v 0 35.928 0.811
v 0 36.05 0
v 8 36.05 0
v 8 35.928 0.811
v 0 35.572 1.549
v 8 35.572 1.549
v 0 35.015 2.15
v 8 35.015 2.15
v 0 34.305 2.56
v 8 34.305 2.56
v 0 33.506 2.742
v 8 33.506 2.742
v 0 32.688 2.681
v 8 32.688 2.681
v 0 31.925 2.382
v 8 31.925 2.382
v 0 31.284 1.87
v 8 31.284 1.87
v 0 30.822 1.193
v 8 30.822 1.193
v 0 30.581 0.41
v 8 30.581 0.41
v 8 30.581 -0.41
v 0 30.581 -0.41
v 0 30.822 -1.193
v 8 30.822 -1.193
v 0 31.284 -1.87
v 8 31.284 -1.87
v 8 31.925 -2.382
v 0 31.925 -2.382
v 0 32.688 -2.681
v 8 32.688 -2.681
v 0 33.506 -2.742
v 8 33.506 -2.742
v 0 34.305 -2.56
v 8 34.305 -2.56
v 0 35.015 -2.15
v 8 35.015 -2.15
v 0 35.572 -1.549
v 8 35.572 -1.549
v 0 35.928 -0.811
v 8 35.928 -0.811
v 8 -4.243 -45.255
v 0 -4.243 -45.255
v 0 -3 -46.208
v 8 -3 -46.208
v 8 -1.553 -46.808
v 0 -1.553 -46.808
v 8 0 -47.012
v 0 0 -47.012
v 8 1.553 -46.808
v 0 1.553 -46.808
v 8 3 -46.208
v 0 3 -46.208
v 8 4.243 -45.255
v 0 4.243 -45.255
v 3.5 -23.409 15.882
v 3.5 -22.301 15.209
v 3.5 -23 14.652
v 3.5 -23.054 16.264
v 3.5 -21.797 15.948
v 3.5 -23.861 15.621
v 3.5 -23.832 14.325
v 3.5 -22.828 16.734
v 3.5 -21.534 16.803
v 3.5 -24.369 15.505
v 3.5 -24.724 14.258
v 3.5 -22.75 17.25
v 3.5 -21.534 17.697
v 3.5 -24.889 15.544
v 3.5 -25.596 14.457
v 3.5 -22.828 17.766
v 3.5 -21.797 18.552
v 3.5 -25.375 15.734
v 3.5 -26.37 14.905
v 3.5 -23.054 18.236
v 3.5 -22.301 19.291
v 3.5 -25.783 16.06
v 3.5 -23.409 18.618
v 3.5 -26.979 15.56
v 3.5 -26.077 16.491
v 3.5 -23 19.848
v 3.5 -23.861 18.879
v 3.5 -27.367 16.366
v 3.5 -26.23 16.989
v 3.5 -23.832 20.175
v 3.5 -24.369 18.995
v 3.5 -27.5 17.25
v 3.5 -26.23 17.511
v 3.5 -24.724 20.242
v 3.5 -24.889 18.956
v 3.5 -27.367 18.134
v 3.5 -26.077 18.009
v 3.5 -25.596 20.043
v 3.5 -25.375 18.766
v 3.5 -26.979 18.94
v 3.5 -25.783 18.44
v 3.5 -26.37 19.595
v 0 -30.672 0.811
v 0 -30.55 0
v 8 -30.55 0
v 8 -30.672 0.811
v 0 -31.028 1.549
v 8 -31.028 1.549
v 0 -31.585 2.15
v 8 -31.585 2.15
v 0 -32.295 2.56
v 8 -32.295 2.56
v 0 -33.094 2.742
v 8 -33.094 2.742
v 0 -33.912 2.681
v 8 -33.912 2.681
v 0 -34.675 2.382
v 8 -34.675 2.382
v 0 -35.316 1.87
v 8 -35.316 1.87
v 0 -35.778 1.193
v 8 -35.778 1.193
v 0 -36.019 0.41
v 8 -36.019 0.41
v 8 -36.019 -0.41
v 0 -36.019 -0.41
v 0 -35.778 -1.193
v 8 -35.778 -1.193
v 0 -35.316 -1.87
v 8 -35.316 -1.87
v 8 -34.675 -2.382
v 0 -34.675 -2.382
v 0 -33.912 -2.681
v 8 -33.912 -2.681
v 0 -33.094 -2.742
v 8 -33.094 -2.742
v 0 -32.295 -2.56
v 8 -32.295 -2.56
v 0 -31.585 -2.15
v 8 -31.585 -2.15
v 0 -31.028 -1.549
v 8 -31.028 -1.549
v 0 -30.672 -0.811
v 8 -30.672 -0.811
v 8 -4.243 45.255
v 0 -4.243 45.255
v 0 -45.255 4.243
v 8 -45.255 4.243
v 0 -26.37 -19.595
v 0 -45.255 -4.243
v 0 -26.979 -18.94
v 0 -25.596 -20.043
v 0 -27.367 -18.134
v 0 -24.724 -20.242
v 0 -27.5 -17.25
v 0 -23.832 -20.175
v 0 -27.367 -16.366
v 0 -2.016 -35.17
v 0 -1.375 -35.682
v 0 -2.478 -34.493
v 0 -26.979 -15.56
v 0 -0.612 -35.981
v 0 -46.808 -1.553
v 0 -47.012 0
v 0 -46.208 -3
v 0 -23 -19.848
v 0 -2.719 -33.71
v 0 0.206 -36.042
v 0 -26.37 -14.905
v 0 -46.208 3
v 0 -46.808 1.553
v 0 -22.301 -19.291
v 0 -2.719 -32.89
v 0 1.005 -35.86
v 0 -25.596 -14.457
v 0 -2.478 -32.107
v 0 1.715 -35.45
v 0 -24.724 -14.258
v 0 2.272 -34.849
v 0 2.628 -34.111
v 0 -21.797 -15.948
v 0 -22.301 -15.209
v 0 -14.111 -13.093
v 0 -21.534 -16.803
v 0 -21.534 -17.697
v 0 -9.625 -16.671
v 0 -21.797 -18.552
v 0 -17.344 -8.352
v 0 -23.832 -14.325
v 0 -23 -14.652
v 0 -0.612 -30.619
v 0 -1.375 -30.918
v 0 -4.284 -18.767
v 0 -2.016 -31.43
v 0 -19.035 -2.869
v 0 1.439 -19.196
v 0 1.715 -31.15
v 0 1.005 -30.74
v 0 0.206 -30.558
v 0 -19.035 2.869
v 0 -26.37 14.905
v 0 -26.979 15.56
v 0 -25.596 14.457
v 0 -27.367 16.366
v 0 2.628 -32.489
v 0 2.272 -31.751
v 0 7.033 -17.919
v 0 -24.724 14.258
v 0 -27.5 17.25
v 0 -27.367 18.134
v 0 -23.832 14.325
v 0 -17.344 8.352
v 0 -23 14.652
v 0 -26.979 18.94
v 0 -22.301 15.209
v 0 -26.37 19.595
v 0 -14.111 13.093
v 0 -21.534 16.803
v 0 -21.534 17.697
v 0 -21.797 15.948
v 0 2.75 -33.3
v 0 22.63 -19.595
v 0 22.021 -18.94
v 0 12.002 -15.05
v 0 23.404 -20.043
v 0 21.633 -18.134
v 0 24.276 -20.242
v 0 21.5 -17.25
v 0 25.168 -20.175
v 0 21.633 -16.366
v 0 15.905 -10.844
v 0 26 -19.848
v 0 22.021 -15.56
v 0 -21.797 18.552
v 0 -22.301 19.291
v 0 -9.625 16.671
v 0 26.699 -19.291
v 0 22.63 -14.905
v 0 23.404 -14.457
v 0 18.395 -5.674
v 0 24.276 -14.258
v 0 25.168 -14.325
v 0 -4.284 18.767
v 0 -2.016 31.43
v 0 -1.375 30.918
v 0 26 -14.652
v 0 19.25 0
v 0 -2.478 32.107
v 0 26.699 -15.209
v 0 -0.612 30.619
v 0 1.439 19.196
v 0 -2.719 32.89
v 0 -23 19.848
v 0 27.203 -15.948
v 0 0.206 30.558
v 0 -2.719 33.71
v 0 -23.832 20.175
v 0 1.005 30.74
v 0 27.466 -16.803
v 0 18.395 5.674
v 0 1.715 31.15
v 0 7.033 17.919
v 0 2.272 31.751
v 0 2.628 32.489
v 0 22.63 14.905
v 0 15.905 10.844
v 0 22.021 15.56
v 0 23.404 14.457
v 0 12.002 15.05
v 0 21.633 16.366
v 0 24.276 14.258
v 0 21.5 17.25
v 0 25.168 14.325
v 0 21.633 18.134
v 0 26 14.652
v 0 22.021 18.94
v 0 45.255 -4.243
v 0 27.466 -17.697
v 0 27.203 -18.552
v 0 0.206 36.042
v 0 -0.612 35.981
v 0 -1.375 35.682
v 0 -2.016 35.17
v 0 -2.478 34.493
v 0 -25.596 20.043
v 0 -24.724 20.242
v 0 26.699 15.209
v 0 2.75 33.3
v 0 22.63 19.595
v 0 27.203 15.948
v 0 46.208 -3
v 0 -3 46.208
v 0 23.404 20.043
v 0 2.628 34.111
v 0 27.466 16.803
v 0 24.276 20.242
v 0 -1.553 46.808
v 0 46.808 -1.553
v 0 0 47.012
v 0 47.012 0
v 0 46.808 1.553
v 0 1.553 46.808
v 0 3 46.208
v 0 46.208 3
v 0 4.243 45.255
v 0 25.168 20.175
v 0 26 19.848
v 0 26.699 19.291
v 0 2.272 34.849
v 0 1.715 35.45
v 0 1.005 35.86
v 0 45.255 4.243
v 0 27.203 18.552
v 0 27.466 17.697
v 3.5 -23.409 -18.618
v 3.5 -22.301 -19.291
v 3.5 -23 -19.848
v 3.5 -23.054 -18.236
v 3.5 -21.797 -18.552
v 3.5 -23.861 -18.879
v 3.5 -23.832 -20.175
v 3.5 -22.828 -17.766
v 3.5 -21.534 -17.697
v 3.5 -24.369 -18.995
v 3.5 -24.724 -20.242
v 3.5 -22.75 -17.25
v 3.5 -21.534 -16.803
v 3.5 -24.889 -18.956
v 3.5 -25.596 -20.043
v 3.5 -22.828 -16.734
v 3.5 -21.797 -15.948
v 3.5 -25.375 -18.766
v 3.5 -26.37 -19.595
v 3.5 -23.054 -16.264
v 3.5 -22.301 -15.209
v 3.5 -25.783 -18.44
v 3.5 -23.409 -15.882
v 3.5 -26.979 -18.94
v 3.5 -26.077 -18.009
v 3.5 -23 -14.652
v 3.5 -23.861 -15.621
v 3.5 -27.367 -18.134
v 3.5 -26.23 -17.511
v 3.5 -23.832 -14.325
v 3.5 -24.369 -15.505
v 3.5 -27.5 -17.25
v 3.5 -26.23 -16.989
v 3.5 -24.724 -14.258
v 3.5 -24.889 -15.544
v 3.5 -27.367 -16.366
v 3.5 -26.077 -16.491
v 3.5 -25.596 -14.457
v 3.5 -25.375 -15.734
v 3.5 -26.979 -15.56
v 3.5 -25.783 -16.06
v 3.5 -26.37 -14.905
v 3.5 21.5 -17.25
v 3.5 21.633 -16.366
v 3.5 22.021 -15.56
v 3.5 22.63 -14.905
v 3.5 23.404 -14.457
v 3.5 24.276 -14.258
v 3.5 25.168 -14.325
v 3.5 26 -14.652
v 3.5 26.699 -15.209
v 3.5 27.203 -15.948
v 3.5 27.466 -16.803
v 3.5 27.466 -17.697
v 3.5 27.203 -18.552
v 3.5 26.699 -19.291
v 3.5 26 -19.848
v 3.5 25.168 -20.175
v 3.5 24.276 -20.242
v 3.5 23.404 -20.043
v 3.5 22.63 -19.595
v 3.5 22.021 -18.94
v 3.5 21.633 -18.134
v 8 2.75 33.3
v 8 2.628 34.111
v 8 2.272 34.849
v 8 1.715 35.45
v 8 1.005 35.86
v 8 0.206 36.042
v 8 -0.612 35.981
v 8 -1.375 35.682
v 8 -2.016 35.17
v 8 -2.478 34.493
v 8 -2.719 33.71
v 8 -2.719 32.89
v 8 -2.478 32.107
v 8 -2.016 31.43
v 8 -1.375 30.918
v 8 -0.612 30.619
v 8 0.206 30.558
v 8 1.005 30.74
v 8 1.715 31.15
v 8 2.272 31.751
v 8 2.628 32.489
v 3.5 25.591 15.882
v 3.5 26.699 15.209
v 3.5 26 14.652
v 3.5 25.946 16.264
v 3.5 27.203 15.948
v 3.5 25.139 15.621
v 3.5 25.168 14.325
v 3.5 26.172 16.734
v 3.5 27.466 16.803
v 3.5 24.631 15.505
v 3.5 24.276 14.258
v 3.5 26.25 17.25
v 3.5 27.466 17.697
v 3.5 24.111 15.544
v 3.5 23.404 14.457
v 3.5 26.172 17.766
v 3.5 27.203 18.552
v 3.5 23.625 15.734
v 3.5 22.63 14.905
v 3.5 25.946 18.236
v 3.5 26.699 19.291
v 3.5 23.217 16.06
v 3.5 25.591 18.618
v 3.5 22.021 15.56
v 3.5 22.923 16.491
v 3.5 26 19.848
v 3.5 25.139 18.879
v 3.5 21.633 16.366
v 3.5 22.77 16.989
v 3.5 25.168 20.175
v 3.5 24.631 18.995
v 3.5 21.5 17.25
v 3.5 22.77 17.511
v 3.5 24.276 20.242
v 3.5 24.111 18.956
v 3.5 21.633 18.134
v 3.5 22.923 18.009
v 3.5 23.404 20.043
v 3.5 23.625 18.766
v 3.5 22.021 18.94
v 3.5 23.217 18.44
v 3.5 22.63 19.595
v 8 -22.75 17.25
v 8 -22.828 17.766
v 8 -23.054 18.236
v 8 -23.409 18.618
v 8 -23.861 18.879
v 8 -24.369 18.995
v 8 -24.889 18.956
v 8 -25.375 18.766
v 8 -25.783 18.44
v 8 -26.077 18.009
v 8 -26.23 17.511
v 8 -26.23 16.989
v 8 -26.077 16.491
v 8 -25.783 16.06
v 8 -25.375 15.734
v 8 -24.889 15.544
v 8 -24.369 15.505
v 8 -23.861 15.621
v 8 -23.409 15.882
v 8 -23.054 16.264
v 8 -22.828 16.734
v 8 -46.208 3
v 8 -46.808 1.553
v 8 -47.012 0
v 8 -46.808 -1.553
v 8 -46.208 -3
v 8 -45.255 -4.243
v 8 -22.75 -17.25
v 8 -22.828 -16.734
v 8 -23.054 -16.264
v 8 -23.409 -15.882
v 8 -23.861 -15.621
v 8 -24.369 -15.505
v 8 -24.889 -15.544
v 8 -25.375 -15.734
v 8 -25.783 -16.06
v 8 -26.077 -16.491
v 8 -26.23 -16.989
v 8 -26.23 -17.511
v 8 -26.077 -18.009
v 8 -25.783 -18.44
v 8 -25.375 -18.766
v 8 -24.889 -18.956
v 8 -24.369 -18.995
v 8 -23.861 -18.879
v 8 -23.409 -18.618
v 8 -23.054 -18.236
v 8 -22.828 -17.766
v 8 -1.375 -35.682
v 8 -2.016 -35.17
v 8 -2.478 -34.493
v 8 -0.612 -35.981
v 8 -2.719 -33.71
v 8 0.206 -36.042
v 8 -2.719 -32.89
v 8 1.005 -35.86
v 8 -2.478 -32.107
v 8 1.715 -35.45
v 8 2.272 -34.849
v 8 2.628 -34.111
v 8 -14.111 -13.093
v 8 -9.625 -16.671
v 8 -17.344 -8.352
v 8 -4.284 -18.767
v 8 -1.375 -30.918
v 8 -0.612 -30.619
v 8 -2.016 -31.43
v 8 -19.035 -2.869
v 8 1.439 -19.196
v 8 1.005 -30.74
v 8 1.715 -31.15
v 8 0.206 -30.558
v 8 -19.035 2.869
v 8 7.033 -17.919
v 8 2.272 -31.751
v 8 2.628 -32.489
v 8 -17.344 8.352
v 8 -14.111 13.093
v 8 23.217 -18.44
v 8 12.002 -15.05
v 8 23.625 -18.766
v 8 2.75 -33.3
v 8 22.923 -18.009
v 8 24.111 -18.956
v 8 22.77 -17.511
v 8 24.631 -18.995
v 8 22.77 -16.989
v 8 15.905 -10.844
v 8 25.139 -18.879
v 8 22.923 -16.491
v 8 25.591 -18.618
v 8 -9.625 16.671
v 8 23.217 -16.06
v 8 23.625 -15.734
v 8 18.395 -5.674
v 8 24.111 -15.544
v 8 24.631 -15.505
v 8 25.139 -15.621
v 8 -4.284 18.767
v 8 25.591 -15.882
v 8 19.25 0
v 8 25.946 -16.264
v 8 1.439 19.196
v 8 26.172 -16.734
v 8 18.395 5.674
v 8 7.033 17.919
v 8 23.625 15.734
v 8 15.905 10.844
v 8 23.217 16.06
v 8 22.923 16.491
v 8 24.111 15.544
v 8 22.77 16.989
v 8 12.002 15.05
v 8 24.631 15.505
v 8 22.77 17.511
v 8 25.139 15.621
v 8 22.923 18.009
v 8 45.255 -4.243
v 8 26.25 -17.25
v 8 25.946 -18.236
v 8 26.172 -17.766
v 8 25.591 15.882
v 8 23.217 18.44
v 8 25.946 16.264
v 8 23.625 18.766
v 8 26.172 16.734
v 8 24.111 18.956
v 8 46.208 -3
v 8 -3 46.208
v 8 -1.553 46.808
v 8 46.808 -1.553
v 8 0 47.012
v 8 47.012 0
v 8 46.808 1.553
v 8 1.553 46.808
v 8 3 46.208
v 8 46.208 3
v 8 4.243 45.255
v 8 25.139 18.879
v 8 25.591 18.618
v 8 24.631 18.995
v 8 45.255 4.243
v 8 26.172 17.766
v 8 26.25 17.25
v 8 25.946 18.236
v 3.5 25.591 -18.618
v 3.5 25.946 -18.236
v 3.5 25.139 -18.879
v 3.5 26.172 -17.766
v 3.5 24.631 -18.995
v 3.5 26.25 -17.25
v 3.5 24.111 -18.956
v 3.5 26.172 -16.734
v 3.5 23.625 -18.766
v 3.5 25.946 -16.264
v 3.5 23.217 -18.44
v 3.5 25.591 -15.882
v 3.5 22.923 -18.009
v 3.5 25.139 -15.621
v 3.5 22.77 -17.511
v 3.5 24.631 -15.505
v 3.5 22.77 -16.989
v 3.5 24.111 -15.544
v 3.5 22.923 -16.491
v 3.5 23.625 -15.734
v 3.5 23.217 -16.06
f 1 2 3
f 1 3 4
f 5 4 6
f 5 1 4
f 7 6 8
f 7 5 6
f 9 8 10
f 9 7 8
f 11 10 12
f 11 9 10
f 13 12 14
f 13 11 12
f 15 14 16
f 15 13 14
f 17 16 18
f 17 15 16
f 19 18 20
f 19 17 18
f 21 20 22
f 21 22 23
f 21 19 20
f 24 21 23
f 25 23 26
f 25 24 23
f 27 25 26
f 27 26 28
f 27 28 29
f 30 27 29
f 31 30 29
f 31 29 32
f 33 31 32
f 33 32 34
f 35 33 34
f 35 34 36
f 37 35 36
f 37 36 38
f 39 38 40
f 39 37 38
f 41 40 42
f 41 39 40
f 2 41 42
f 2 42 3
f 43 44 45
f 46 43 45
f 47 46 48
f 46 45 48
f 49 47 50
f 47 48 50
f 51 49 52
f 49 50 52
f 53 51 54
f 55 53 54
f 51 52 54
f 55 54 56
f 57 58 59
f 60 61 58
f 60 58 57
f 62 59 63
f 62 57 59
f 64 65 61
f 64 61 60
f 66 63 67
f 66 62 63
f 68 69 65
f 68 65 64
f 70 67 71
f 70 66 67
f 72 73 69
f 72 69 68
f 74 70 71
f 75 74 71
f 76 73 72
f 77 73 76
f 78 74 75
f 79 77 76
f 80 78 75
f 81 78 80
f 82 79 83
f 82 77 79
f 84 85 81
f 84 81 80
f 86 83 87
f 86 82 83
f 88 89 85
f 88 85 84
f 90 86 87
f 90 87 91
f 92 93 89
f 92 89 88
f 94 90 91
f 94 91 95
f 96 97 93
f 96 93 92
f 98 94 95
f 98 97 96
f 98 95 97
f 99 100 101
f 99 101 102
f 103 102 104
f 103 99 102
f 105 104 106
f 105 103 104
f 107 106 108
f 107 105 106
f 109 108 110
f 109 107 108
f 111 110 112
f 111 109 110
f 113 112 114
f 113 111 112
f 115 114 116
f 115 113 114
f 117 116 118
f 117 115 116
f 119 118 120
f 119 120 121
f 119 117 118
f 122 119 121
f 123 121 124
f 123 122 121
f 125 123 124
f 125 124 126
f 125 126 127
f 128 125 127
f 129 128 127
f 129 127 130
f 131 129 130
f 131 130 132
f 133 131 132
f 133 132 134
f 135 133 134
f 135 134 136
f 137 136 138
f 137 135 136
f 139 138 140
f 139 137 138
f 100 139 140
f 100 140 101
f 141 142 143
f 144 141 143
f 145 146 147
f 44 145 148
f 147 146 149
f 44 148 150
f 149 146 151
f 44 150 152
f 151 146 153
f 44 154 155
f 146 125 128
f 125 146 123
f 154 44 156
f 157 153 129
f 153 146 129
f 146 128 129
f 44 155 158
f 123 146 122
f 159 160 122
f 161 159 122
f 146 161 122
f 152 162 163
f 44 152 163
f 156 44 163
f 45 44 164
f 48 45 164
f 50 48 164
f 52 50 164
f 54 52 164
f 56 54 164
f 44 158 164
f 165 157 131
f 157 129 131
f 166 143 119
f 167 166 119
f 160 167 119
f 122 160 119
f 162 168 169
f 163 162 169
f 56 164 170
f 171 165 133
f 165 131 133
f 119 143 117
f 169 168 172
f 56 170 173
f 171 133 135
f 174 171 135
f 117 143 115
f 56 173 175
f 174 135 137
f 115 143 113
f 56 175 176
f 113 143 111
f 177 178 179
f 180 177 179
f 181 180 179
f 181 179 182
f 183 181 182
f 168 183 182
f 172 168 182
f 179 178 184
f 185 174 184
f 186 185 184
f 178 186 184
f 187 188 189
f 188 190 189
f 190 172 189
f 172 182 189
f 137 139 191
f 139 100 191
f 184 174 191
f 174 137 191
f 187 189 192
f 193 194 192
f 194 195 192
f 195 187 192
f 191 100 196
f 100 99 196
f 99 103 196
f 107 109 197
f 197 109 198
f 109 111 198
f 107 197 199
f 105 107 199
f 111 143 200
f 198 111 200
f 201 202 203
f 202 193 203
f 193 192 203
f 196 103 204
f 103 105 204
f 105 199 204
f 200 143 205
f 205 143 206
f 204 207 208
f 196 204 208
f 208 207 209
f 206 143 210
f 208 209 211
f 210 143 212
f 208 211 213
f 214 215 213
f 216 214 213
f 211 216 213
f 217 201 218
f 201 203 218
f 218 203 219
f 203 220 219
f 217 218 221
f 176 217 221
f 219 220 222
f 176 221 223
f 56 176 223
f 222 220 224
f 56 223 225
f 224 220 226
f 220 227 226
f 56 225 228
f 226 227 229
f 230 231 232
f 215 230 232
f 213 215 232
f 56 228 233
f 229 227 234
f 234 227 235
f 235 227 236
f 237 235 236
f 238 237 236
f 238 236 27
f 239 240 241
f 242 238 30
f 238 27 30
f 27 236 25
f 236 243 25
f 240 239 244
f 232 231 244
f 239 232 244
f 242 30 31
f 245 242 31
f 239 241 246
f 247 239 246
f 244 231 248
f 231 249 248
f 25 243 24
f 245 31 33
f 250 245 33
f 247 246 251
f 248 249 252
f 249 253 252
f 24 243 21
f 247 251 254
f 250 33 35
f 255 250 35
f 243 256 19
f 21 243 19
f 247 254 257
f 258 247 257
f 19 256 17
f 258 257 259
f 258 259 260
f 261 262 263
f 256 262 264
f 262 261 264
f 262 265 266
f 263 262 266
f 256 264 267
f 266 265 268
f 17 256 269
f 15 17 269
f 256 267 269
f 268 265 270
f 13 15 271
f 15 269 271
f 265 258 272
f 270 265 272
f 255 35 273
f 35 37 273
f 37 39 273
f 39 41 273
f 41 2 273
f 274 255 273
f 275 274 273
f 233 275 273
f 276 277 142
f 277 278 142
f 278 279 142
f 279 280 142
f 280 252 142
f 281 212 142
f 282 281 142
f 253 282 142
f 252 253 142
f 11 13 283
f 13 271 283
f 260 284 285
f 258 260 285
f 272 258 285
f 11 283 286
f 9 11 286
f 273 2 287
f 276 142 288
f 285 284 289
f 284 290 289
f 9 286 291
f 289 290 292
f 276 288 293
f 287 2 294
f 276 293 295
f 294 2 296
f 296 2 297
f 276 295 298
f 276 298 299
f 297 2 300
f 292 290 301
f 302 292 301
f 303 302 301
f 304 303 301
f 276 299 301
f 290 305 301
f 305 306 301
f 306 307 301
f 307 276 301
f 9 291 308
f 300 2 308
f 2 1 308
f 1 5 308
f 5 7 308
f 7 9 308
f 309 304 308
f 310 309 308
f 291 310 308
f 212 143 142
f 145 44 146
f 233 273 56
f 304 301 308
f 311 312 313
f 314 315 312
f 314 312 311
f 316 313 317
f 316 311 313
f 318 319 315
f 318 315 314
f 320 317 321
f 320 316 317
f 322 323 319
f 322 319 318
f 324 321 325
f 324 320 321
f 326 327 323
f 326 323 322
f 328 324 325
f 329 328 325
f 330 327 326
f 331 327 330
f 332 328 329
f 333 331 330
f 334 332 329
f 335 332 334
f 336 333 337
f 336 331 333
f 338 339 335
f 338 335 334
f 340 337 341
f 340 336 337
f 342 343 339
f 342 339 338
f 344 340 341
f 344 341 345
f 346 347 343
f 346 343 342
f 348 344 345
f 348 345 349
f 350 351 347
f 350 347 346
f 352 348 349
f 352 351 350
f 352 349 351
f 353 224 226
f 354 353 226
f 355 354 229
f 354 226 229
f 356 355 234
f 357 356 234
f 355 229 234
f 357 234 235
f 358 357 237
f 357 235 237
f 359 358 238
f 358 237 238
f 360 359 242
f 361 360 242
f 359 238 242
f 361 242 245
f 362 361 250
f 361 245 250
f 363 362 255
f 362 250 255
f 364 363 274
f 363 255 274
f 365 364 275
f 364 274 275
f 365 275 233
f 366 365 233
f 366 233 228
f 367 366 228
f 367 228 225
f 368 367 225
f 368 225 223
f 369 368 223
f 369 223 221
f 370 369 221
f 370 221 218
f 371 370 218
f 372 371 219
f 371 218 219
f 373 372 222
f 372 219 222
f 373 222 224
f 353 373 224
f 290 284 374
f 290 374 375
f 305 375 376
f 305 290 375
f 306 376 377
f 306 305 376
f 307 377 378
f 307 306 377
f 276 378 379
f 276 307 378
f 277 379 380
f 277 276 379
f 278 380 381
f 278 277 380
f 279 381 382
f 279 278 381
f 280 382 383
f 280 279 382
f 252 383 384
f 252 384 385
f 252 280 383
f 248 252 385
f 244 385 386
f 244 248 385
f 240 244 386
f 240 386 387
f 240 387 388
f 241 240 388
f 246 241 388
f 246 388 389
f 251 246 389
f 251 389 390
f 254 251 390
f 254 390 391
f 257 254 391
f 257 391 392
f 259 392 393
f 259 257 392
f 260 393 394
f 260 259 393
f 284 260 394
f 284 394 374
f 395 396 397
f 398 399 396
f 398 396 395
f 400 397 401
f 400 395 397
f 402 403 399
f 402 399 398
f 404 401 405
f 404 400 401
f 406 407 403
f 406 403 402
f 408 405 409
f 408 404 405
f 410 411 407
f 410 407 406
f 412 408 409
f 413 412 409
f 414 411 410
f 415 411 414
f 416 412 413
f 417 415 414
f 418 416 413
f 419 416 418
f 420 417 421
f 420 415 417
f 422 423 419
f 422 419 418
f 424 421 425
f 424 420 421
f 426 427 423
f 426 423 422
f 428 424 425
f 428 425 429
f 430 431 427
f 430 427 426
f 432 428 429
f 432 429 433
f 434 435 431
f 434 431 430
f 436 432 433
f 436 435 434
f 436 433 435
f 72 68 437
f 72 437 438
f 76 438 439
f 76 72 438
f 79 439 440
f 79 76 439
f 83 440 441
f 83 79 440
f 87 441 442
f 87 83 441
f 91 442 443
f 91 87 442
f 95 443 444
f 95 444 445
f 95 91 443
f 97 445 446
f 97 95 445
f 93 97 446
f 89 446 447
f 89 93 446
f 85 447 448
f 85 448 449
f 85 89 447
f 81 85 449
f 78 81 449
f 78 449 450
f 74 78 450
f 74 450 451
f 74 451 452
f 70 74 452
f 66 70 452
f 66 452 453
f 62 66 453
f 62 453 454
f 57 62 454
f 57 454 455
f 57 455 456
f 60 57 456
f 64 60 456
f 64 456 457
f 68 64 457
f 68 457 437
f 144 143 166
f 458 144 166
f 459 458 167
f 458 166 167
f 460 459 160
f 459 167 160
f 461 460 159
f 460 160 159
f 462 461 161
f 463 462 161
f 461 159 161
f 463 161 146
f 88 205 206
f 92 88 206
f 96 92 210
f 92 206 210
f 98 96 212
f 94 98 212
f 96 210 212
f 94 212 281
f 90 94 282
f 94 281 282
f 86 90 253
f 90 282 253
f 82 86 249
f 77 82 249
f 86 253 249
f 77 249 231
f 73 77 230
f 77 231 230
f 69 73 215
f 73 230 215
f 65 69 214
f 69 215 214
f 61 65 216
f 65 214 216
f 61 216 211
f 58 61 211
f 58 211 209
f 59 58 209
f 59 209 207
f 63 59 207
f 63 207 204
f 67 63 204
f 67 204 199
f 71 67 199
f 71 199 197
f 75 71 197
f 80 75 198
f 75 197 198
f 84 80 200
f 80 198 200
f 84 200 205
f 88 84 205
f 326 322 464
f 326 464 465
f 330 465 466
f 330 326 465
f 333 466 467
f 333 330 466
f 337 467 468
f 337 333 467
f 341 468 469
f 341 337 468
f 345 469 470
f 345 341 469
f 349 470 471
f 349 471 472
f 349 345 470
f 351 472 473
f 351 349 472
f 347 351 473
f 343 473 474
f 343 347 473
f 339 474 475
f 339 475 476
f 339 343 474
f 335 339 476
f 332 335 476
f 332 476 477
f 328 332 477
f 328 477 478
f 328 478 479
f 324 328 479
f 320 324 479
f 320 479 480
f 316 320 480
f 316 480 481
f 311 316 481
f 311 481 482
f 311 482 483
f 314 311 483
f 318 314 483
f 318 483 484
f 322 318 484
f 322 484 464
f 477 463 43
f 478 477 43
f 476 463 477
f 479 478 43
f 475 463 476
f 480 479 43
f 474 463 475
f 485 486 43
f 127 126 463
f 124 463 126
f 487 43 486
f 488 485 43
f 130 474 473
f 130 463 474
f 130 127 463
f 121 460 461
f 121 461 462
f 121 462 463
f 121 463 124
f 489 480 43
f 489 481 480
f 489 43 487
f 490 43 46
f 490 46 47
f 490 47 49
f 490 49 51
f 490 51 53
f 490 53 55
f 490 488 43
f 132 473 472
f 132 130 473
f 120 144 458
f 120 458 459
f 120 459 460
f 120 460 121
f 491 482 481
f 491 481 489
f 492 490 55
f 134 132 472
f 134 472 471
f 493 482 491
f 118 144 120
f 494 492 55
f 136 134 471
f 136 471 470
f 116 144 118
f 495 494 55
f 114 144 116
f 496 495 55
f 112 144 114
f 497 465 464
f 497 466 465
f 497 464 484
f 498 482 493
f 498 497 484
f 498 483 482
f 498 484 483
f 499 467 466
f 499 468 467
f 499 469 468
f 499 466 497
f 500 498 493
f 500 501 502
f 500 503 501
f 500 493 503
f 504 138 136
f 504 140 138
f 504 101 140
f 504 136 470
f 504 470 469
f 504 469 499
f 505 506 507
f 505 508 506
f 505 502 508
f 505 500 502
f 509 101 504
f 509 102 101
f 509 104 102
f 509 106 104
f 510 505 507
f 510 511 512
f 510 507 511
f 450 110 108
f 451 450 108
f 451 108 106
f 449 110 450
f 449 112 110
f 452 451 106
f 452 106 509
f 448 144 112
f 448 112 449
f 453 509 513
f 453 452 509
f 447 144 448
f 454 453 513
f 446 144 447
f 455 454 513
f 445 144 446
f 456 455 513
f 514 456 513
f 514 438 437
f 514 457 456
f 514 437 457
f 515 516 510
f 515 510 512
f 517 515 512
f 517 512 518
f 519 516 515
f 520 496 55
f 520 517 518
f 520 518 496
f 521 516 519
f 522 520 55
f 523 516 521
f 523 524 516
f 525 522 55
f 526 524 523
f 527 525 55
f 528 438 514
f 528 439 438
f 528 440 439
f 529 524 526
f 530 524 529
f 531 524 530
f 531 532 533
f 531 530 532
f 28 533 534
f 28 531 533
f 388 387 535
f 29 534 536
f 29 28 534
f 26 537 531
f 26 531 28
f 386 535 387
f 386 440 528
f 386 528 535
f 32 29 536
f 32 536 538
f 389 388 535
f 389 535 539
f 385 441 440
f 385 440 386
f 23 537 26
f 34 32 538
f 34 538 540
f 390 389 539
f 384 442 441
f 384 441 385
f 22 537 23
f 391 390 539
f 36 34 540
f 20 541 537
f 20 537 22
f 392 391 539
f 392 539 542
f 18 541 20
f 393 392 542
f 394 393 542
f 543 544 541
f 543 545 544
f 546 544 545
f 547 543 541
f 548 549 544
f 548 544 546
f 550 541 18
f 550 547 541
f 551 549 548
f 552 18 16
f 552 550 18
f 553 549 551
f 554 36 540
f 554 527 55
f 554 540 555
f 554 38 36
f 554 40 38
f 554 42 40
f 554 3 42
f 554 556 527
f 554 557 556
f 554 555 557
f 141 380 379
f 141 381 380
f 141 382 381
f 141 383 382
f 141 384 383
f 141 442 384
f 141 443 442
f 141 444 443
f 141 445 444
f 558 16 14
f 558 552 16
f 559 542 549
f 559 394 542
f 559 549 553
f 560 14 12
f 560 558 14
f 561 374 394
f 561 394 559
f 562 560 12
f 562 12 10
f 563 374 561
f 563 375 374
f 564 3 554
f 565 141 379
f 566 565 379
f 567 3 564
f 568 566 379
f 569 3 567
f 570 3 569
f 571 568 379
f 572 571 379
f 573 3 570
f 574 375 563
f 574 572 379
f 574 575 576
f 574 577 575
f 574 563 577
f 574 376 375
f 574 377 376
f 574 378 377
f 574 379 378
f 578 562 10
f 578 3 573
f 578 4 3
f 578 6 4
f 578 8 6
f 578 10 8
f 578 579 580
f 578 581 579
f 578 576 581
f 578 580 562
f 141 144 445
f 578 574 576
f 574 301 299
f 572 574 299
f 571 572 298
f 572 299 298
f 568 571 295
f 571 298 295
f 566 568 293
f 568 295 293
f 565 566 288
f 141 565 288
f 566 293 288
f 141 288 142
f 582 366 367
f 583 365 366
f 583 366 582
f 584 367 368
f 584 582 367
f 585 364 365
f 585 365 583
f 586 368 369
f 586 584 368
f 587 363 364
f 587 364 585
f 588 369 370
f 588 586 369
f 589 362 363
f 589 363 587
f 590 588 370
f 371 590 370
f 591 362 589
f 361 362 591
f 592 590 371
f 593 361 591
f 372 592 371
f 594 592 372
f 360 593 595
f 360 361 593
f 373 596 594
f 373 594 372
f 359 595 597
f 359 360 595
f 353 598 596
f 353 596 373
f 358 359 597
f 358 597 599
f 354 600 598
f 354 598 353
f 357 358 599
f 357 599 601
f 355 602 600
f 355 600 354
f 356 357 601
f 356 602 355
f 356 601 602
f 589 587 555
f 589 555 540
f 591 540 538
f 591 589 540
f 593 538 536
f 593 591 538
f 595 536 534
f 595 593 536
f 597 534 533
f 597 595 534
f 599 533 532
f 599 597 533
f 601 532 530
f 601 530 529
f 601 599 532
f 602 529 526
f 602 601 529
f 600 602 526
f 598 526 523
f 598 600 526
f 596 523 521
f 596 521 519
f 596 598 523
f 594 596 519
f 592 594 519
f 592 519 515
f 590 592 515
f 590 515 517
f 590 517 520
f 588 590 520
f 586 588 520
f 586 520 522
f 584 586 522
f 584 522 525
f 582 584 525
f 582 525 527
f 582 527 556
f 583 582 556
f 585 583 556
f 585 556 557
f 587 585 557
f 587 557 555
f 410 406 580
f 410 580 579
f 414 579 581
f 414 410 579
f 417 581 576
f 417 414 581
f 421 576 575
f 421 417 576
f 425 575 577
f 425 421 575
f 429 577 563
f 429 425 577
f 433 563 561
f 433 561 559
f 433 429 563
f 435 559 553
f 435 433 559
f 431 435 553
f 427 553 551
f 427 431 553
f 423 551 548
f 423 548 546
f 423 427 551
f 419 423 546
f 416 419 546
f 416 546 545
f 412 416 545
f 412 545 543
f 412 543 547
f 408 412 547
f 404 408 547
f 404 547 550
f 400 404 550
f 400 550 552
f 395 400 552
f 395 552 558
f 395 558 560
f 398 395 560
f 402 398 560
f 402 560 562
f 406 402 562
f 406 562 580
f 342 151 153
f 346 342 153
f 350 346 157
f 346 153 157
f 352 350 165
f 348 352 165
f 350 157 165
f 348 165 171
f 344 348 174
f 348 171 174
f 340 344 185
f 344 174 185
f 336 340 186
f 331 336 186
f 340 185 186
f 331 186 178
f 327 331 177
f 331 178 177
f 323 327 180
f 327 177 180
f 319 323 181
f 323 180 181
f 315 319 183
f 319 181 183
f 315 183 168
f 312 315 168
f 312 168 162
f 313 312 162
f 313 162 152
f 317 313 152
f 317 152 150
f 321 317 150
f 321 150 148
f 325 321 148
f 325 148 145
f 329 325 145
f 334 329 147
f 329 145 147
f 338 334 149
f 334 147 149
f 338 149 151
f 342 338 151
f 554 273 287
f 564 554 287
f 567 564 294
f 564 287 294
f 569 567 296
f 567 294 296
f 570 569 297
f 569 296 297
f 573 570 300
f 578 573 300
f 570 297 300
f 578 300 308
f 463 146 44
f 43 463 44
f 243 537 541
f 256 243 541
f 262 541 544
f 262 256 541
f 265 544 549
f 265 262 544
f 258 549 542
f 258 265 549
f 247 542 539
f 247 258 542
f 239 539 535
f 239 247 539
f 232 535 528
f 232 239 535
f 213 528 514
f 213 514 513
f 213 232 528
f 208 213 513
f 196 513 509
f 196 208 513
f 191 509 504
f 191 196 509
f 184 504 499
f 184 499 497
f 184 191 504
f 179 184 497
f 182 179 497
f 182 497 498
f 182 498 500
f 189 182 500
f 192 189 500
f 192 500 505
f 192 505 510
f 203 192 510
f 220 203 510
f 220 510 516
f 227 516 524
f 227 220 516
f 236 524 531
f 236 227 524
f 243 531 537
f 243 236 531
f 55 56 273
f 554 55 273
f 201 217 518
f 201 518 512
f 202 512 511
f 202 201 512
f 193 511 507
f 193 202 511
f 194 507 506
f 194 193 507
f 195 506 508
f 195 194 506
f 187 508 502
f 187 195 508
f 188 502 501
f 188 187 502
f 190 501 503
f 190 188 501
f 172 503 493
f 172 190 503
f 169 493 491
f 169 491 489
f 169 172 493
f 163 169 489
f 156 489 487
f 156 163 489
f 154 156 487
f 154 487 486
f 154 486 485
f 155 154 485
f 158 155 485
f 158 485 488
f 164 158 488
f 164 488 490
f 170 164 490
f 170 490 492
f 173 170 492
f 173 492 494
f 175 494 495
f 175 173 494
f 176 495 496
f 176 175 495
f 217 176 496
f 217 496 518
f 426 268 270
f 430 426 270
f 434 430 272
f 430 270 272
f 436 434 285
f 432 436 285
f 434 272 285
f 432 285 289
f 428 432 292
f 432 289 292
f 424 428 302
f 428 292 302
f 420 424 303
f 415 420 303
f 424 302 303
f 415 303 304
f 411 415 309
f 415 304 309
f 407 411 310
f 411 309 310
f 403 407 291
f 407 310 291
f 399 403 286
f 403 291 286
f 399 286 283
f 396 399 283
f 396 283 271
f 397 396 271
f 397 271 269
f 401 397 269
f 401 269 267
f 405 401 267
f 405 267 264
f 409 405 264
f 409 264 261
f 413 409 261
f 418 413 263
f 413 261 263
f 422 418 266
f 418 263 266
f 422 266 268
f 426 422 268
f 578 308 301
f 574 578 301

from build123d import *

# Parameters (mm, degrees)
F0_R     = 1.75
F0_R_2   = 2.75
F0_R_3   = 19.25
F1_DEPTH = 8
F2_R     = 3
F3_DEPTH = 3.5


with BuildPart() as f1:
    # F0 (on Right) → F1 (new body)
    with BuildSketch(Plane.YZ):
        with BuildLine():
            ThreePointArc((4.242641, 45.254834), (0, 47.012193), (-4.242641, 45.254834))
            Line((-4.242641, 45.254834), (-45.254834, 4.242641))
            ThreePointArc((-45.254834, 4.242641), (-47.012193, 0), (-45.254834, -4.242641))
            Line((-45.254834, -4.242641), (-4.242641, -45.254834))
            ThreePointArc((-4.242641, -45.254834), (0, -47.012193), (4.242641, -45.254834))
            Line((4.242641, -45.254834), (45.254834, -4.242641))
            ThreePointArc((45.254834, -4.242641), (47.012193, 0), (45.254834, 4.242641))
            Line((45.254834, 4.242641), (4.242641, 45.254834))
        make_face()
        with Locations((-24.5, -17.25)):
            Circle(F0_R, mode=Mode.SUBTRACT)
        with Locations((0, -33.3)):
            Circle(F0_R_2, mode=Mode.SUBTRACT)
        with Locations((24.5, -17.25)):
            Circle(F0_R, mode=Mode.SUBTRACT)
        with Locations((-33.3, 0)):
            Circle(F0_R_2, mode=Mode.SUBTRACT)
        with Locations((-24.5, 17.25)):
            Circle(F0_R, mode=Mode.SUBTRACT)
        Circle(F0_R_3, mode=Mode.SUBTRACT)
        with Locations((33.3, 0)):
            Circle(F0_R_2, mode=Mode.SUBTRACT)
        with Locations((24.5, 17.25)):
            Circle(F0_R, mode=Mode.SUBTRACT)
        with Locations((0, 33.3)):
            Circle(F0_R_2, mode=Mode.SUBTRACT)
    extrude(amount=F1_DEPTH)

    # F2 (on face) → F3 (cut)
    with BuildSketch(Plane(origin=(0, 0, 0), x_dir=(0, -1, 0), z_dir=(-1, 0, 0))):
        with Locations((24.5, 17.25)):
            Circle(F2_R)
        with Locations((-24.5, 17.25)):
            Circle(F2_R)
        with Locations((-24.5, -17.25)):
            Circle(F2_R)
        with Locations((24.5, -17.25)):
            Circle(F2_R)
    extrude(amount=-F3_DEPTH, mode=Mode.SUBTRACT)


solid = f1.part
